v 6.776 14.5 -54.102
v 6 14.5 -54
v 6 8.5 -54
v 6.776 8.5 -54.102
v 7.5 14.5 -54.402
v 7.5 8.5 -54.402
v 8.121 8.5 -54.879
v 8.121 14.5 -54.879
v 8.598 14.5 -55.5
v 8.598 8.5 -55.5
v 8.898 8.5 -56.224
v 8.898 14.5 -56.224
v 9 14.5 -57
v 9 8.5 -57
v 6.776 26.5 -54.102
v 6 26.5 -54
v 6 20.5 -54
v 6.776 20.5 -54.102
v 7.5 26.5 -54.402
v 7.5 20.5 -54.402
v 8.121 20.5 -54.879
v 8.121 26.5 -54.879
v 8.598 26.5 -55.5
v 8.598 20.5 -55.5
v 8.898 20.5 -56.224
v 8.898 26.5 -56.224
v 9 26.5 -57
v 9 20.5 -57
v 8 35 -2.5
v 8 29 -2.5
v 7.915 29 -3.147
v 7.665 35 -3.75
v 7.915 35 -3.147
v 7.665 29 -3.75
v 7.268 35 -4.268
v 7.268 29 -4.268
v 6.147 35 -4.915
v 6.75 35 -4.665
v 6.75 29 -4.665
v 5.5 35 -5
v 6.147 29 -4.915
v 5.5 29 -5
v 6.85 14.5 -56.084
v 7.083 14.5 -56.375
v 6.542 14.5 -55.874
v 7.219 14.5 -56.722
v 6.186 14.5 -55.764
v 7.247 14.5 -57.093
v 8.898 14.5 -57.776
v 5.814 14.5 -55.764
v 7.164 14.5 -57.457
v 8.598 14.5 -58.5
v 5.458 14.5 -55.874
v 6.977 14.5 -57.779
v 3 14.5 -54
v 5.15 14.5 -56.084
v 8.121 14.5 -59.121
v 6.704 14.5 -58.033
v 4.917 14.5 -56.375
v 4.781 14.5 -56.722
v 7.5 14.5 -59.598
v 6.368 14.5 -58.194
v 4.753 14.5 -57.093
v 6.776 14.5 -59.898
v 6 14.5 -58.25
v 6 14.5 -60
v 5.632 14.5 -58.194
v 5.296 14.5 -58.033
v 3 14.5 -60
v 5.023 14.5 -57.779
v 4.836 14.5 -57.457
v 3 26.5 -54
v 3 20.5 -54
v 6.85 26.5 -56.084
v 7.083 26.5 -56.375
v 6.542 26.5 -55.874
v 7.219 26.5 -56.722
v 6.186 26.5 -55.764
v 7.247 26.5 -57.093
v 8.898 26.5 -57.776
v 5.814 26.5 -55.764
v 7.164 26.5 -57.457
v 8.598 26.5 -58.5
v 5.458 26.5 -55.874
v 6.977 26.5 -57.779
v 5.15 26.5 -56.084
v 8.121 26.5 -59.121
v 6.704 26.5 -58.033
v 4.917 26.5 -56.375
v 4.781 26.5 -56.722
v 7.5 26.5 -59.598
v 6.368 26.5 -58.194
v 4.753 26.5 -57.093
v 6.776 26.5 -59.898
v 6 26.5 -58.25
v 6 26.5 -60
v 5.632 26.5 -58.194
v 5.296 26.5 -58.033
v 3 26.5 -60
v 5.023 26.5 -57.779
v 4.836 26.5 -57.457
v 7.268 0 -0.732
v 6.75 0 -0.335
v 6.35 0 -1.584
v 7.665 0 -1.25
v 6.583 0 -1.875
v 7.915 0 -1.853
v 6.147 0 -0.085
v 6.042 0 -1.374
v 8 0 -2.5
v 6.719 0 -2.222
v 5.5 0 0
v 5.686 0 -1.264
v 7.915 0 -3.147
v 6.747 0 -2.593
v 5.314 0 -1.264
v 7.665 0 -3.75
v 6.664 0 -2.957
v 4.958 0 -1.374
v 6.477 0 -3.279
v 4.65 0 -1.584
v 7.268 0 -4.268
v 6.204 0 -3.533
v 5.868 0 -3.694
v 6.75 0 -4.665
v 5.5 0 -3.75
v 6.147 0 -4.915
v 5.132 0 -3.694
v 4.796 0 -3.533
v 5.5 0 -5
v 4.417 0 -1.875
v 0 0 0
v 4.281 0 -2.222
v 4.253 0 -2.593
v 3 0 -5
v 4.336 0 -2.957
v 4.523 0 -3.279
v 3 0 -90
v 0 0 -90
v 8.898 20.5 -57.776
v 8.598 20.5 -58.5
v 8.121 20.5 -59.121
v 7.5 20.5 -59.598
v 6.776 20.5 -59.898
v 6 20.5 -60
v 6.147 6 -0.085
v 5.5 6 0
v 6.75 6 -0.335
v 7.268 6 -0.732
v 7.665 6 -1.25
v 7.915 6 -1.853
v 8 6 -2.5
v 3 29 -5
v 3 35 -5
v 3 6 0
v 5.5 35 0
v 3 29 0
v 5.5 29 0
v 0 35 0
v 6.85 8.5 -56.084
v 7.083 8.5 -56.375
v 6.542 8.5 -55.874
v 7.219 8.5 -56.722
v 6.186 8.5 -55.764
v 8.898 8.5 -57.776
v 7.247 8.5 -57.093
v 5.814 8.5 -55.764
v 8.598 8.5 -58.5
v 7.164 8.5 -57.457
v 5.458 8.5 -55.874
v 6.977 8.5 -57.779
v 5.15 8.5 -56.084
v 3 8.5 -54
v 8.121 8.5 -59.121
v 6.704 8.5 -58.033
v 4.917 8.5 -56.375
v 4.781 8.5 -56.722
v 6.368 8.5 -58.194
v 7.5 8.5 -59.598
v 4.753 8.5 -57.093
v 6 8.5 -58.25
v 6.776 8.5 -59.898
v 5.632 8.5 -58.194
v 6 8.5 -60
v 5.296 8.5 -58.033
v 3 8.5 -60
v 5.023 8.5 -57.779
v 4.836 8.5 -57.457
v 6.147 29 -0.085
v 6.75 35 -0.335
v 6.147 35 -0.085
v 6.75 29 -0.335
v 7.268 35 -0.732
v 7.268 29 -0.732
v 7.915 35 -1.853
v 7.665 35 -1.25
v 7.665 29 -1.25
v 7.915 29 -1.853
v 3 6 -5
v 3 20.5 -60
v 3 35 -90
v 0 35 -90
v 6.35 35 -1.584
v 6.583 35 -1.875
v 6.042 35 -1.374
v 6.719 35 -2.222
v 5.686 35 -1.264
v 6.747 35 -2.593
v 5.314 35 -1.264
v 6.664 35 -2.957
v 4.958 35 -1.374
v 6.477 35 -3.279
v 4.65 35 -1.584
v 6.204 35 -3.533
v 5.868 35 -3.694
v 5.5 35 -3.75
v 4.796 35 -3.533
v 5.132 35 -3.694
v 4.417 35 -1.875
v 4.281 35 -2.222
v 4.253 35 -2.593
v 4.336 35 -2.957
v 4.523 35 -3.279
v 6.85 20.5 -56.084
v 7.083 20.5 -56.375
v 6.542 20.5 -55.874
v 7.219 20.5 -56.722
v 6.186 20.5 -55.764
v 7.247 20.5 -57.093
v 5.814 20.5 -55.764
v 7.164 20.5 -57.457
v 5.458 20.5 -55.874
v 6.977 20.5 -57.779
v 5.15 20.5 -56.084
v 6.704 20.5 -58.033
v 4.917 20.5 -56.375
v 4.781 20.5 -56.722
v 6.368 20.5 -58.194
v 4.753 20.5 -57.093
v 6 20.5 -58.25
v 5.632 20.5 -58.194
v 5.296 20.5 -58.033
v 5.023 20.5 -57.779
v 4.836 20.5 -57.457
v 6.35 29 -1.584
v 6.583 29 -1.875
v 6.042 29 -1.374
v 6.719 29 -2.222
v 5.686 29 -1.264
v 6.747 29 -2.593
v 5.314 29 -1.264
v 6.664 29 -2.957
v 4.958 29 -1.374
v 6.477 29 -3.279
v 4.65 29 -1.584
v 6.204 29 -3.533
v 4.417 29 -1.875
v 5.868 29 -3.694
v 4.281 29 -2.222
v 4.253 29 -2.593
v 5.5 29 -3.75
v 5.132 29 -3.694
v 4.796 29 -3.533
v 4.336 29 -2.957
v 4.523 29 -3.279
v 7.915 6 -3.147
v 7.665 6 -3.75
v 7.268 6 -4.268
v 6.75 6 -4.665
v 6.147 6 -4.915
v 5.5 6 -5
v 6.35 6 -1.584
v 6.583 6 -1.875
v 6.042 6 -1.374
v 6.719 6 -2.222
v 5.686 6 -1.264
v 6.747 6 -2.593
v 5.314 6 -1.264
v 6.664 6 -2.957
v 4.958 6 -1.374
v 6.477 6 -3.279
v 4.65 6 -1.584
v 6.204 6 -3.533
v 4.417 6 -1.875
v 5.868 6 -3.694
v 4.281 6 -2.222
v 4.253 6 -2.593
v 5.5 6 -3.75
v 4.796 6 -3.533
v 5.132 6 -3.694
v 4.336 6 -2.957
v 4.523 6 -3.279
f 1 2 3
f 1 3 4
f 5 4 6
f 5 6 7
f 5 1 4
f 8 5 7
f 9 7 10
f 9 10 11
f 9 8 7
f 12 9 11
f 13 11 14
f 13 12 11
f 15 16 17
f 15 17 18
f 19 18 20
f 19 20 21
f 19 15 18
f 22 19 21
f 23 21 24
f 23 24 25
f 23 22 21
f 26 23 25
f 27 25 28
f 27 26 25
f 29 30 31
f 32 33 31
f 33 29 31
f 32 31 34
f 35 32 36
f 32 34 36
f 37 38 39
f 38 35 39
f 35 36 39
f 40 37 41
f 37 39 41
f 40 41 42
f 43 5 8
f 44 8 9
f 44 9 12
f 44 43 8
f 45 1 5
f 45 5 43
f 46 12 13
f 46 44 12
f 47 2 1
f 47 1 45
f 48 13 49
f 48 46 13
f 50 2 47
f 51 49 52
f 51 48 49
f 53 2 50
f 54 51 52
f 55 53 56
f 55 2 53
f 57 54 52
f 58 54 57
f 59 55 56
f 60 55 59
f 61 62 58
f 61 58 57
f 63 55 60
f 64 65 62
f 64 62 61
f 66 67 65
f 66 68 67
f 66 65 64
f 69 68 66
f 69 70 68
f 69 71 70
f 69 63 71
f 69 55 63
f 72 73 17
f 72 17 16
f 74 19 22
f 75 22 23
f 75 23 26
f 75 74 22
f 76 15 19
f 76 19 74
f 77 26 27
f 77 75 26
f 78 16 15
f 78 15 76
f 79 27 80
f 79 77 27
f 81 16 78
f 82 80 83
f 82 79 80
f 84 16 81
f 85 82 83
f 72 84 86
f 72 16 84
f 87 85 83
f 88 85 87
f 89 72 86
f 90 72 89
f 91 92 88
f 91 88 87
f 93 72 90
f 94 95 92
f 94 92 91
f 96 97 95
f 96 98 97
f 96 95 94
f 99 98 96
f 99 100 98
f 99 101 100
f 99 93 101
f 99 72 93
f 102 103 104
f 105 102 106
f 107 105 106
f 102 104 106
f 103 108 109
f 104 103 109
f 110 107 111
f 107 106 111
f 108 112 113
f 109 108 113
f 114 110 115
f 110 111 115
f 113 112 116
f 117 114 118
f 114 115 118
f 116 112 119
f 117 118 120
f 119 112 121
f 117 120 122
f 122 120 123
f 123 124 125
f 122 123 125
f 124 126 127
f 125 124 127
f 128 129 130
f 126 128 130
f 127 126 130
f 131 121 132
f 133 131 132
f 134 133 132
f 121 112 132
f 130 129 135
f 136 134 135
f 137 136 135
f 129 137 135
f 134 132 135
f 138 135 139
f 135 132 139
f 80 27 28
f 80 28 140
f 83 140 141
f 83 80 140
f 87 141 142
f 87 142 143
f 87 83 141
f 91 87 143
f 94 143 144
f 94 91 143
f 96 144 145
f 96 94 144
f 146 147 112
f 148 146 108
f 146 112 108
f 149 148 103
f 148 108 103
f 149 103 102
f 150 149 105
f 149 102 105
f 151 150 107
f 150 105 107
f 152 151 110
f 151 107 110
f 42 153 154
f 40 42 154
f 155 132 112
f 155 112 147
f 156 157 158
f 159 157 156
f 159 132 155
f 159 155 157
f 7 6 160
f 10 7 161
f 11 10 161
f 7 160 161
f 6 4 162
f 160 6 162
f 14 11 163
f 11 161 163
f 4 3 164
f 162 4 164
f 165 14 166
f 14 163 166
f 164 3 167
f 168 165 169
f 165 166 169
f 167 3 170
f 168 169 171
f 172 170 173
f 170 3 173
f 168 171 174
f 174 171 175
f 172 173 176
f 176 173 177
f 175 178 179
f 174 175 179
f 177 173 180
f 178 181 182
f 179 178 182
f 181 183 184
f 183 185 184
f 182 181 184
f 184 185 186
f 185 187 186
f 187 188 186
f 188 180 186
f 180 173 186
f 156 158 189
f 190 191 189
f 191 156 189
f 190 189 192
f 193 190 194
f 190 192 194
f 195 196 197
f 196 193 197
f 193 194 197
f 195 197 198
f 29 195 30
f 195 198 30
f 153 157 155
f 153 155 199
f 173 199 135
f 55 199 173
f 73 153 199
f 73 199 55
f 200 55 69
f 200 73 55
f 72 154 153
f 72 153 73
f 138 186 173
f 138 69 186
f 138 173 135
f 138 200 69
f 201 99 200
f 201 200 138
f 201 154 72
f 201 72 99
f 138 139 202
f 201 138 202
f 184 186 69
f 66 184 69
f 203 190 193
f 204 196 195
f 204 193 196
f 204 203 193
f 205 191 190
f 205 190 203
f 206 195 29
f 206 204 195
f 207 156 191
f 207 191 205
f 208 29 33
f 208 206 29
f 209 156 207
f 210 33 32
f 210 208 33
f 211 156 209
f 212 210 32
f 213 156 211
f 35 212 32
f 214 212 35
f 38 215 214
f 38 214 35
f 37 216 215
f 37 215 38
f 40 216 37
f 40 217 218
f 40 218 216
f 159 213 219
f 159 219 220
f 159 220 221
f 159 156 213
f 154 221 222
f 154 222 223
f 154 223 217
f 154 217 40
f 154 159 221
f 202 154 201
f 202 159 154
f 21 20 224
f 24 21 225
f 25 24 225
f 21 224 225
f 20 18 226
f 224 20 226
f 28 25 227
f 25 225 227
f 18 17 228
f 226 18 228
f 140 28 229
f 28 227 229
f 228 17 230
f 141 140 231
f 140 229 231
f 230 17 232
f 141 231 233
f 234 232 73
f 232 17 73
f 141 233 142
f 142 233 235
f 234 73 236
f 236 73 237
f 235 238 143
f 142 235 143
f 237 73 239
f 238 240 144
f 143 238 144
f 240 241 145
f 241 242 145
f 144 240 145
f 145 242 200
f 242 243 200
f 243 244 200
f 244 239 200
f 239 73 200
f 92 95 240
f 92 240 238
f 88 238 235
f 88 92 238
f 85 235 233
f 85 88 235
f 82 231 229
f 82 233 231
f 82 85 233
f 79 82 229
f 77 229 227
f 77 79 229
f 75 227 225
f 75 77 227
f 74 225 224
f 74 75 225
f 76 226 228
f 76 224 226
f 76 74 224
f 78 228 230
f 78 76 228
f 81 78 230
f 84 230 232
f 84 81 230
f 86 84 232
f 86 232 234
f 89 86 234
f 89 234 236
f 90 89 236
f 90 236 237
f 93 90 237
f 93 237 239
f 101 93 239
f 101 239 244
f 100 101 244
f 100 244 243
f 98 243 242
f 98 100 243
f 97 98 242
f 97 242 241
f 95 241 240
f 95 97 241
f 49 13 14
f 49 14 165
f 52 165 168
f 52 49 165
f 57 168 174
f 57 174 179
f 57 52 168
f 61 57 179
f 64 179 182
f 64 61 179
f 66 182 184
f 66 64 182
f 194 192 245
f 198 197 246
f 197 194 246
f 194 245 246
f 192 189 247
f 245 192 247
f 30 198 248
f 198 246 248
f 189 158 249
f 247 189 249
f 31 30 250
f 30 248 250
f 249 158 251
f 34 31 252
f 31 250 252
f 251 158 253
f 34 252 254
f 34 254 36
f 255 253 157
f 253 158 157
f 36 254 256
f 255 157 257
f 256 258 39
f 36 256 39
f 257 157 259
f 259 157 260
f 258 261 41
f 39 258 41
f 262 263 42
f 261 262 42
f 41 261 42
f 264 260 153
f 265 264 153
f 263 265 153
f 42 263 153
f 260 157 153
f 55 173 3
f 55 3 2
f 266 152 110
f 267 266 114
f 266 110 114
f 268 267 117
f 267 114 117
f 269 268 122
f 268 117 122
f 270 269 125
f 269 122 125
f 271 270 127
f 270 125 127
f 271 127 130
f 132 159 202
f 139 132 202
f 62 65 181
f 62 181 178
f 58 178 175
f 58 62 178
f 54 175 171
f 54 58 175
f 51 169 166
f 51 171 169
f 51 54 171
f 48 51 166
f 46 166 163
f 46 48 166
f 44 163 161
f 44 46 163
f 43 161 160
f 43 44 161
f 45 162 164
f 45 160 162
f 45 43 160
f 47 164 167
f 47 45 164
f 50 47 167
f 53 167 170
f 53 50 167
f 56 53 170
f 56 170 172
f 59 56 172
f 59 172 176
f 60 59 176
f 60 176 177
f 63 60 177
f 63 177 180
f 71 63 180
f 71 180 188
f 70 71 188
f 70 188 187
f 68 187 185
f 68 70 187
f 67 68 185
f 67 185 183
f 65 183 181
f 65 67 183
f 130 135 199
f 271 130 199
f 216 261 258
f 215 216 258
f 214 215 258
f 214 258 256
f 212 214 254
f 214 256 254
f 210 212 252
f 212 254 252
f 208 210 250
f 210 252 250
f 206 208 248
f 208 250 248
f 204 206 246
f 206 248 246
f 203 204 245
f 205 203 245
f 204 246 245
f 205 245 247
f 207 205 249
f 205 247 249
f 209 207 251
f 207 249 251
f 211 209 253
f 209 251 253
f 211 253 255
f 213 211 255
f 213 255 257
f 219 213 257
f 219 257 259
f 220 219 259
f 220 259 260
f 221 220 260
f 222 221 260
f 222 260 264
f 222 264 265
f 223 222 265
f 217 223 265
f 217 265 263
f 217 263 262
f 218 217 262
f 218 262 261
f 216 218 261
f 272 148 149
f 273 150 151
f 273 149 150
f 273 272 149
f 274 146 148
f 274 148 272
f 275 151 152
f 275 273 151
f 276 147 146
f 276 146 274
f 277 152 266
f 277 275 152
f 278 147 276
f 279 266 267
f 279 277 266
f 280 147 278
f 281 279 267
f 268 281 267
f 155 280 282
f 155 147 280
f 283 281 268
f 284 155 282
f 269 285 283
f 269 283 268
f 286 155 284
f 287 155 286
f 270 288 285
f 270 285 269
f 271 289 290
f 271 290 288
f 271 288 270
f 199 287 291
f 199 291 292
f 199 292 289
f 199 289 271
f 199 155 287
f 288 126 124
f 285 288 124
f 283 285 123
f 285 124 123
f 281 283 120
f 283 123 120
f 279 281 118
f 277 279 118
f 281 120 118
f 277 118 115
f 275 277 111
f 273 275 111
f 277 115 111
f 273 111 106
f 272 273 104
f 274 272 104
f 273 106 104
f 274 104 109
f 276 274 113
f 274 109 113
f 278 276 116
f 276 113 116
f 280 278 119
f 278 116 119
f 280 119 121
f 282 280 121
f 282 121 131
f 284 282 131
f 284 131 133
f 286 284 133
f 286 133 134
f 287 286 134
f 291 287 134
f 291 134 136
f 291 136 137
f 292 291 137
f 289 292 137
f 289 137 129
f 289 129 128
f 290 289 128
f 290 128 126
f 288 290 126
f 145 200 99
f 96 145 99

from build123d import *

# Parameters (mm, degrees)
SKETCH_1_W               = 90
SKETCH_1_H               = 35
EXTRUDE_1_DEPTH          = 3
SKETCH_2_W               = 5
SKETCH_2_H               = 6
EXTRUDE_2_DEPTH          = 5
SKETCH_3_R               = 1.25
CUT_EXTRUDE_1_DEPTH      = 97.896852374
SKETCH_4_W               = 6
SKETCH_4_H               = 6
EXTRUDE_3_DEPTH          = 6
CUT_EXTRUDE_2_DEPTH      = 95.25099469
CUT_EXTRUDE_2_DEPTH_BACK = 95.25099469
SKETCH_5_R               = 1.25


with BuildPart() as part:
    # Эскиз1 → Бобышка-Вытянуть1 (new body)
    with BuildSketch(Plane(origin=(0, 0, 0), x_dir=(0, 0, -1), z_dir=(1, 0, 0))):
        with Locations((45, 17.5)):
            Rectangle(SKETCH_1_W, SKETCH_1_H)
    extrude(amount=EXTRUDE_1_DEPTH)

    # Эскиз2 → Бобышка-Вытянуть2 (add)
    with BuildSketch(Plane(origin=(3, 0, 0), x_dir=(0, 0, -1), z_dir=(1, 0, 0))):
        with Locations((2.5, 32)):
            Rectangle(SKETCH_2_W, SKETCH_2_H)
        with Locations((2.5, 3)):
            Rectangle(SKETCH_2_W, SKETCH_2_H)
    extrude(amount=EXTRUDE_2_DEPTH)

    # Эскиз3 → Вырез-Вытянуть1 (cut, through all)
    with BuildSketch(Plane(origin=(0, 0, 0), x_dir=(-1, 0, 0), z_dir=(0, -1, 0))):
        with Locations(Location((-5.5, 2.5, 0), (0, 0, 90))):
            Circle(SKETCH_3_R)
        with BuildLine():
            Line((-8, 5), (-8, 2.5))
            ThreePointArc((-8, 2.5), (-7.267766953, 4.267766953), (-5.5, 5))
            Line((-5.5, 5), (-8, 5))
        make_face()
        with BuildLine():
            Line((-8, 0), (-5.5, 0))
            ThreePointArc((-5.5, 0), (-7.267766953, 0.732233047), (-8, 2.5))
            Line((-8, 2.5), (-8, 0))
        make_face()
    extrude(amount=-CUT_EXTRUDE_1_DEPTH, mode=Mode.SUBTRACT)

    # Эскиз4 → Бобышка-Вытянуть3 (add)
    with BuildSketch(Plane(origin=(3, 0, 0), x_dir=(0, 0, -1), z_dir=(1, 0, 0))):
        with Locations((57, 23.5)):
            Rectangle(SKETCH_4_W, SKETCH_4_H)
        with Locations((57, 11.5)):
            Rectangle(SKETCH_4_W, SKETCH_4_H)
    extrude(amount=EXTRUDE_3_DEPTH)

    # Эскиз5 → Вырез-Вытянуть2 (cut, two sides: drawn at the far end of the back side and taken through both)
    with BuildSketch(Plane(origin=(0, 8.5, 0), x_dir=(-1, 0, 0), z_dir=(0, -1, 0)).offset(-CUT_EXTRUDE_2_DEPTH_BACK)):
        with Locations(Location((-6, 57, 0), (0, 0, 90))):
            Circle(SKETCH_5_R)
        with BuildLine():
            Line((-9, 60), (-9, 57.000000015))
            ThreePointArc((-9, 57.000000015), (-8.121320338, 59.121320349), (-6, 60))
            Line((-6, 60), (-9, 60))
        make_face()
        with BuildLine():
            Line((-9, 54), (-6, 54))
            ThreePointArc((-6, 54), (-8.121320349, 54.878679662), (-9, 57.000000015))
            Line((-9, 57.000000015), (-9, 54))
        make_face()
    extrude(amount=CUT_EXTRUDE_2_DEPTH + CUT_EXTRUDE_2_DEPTH_BACK, mode=Mode.SUBTRACT)


solid = part.part
